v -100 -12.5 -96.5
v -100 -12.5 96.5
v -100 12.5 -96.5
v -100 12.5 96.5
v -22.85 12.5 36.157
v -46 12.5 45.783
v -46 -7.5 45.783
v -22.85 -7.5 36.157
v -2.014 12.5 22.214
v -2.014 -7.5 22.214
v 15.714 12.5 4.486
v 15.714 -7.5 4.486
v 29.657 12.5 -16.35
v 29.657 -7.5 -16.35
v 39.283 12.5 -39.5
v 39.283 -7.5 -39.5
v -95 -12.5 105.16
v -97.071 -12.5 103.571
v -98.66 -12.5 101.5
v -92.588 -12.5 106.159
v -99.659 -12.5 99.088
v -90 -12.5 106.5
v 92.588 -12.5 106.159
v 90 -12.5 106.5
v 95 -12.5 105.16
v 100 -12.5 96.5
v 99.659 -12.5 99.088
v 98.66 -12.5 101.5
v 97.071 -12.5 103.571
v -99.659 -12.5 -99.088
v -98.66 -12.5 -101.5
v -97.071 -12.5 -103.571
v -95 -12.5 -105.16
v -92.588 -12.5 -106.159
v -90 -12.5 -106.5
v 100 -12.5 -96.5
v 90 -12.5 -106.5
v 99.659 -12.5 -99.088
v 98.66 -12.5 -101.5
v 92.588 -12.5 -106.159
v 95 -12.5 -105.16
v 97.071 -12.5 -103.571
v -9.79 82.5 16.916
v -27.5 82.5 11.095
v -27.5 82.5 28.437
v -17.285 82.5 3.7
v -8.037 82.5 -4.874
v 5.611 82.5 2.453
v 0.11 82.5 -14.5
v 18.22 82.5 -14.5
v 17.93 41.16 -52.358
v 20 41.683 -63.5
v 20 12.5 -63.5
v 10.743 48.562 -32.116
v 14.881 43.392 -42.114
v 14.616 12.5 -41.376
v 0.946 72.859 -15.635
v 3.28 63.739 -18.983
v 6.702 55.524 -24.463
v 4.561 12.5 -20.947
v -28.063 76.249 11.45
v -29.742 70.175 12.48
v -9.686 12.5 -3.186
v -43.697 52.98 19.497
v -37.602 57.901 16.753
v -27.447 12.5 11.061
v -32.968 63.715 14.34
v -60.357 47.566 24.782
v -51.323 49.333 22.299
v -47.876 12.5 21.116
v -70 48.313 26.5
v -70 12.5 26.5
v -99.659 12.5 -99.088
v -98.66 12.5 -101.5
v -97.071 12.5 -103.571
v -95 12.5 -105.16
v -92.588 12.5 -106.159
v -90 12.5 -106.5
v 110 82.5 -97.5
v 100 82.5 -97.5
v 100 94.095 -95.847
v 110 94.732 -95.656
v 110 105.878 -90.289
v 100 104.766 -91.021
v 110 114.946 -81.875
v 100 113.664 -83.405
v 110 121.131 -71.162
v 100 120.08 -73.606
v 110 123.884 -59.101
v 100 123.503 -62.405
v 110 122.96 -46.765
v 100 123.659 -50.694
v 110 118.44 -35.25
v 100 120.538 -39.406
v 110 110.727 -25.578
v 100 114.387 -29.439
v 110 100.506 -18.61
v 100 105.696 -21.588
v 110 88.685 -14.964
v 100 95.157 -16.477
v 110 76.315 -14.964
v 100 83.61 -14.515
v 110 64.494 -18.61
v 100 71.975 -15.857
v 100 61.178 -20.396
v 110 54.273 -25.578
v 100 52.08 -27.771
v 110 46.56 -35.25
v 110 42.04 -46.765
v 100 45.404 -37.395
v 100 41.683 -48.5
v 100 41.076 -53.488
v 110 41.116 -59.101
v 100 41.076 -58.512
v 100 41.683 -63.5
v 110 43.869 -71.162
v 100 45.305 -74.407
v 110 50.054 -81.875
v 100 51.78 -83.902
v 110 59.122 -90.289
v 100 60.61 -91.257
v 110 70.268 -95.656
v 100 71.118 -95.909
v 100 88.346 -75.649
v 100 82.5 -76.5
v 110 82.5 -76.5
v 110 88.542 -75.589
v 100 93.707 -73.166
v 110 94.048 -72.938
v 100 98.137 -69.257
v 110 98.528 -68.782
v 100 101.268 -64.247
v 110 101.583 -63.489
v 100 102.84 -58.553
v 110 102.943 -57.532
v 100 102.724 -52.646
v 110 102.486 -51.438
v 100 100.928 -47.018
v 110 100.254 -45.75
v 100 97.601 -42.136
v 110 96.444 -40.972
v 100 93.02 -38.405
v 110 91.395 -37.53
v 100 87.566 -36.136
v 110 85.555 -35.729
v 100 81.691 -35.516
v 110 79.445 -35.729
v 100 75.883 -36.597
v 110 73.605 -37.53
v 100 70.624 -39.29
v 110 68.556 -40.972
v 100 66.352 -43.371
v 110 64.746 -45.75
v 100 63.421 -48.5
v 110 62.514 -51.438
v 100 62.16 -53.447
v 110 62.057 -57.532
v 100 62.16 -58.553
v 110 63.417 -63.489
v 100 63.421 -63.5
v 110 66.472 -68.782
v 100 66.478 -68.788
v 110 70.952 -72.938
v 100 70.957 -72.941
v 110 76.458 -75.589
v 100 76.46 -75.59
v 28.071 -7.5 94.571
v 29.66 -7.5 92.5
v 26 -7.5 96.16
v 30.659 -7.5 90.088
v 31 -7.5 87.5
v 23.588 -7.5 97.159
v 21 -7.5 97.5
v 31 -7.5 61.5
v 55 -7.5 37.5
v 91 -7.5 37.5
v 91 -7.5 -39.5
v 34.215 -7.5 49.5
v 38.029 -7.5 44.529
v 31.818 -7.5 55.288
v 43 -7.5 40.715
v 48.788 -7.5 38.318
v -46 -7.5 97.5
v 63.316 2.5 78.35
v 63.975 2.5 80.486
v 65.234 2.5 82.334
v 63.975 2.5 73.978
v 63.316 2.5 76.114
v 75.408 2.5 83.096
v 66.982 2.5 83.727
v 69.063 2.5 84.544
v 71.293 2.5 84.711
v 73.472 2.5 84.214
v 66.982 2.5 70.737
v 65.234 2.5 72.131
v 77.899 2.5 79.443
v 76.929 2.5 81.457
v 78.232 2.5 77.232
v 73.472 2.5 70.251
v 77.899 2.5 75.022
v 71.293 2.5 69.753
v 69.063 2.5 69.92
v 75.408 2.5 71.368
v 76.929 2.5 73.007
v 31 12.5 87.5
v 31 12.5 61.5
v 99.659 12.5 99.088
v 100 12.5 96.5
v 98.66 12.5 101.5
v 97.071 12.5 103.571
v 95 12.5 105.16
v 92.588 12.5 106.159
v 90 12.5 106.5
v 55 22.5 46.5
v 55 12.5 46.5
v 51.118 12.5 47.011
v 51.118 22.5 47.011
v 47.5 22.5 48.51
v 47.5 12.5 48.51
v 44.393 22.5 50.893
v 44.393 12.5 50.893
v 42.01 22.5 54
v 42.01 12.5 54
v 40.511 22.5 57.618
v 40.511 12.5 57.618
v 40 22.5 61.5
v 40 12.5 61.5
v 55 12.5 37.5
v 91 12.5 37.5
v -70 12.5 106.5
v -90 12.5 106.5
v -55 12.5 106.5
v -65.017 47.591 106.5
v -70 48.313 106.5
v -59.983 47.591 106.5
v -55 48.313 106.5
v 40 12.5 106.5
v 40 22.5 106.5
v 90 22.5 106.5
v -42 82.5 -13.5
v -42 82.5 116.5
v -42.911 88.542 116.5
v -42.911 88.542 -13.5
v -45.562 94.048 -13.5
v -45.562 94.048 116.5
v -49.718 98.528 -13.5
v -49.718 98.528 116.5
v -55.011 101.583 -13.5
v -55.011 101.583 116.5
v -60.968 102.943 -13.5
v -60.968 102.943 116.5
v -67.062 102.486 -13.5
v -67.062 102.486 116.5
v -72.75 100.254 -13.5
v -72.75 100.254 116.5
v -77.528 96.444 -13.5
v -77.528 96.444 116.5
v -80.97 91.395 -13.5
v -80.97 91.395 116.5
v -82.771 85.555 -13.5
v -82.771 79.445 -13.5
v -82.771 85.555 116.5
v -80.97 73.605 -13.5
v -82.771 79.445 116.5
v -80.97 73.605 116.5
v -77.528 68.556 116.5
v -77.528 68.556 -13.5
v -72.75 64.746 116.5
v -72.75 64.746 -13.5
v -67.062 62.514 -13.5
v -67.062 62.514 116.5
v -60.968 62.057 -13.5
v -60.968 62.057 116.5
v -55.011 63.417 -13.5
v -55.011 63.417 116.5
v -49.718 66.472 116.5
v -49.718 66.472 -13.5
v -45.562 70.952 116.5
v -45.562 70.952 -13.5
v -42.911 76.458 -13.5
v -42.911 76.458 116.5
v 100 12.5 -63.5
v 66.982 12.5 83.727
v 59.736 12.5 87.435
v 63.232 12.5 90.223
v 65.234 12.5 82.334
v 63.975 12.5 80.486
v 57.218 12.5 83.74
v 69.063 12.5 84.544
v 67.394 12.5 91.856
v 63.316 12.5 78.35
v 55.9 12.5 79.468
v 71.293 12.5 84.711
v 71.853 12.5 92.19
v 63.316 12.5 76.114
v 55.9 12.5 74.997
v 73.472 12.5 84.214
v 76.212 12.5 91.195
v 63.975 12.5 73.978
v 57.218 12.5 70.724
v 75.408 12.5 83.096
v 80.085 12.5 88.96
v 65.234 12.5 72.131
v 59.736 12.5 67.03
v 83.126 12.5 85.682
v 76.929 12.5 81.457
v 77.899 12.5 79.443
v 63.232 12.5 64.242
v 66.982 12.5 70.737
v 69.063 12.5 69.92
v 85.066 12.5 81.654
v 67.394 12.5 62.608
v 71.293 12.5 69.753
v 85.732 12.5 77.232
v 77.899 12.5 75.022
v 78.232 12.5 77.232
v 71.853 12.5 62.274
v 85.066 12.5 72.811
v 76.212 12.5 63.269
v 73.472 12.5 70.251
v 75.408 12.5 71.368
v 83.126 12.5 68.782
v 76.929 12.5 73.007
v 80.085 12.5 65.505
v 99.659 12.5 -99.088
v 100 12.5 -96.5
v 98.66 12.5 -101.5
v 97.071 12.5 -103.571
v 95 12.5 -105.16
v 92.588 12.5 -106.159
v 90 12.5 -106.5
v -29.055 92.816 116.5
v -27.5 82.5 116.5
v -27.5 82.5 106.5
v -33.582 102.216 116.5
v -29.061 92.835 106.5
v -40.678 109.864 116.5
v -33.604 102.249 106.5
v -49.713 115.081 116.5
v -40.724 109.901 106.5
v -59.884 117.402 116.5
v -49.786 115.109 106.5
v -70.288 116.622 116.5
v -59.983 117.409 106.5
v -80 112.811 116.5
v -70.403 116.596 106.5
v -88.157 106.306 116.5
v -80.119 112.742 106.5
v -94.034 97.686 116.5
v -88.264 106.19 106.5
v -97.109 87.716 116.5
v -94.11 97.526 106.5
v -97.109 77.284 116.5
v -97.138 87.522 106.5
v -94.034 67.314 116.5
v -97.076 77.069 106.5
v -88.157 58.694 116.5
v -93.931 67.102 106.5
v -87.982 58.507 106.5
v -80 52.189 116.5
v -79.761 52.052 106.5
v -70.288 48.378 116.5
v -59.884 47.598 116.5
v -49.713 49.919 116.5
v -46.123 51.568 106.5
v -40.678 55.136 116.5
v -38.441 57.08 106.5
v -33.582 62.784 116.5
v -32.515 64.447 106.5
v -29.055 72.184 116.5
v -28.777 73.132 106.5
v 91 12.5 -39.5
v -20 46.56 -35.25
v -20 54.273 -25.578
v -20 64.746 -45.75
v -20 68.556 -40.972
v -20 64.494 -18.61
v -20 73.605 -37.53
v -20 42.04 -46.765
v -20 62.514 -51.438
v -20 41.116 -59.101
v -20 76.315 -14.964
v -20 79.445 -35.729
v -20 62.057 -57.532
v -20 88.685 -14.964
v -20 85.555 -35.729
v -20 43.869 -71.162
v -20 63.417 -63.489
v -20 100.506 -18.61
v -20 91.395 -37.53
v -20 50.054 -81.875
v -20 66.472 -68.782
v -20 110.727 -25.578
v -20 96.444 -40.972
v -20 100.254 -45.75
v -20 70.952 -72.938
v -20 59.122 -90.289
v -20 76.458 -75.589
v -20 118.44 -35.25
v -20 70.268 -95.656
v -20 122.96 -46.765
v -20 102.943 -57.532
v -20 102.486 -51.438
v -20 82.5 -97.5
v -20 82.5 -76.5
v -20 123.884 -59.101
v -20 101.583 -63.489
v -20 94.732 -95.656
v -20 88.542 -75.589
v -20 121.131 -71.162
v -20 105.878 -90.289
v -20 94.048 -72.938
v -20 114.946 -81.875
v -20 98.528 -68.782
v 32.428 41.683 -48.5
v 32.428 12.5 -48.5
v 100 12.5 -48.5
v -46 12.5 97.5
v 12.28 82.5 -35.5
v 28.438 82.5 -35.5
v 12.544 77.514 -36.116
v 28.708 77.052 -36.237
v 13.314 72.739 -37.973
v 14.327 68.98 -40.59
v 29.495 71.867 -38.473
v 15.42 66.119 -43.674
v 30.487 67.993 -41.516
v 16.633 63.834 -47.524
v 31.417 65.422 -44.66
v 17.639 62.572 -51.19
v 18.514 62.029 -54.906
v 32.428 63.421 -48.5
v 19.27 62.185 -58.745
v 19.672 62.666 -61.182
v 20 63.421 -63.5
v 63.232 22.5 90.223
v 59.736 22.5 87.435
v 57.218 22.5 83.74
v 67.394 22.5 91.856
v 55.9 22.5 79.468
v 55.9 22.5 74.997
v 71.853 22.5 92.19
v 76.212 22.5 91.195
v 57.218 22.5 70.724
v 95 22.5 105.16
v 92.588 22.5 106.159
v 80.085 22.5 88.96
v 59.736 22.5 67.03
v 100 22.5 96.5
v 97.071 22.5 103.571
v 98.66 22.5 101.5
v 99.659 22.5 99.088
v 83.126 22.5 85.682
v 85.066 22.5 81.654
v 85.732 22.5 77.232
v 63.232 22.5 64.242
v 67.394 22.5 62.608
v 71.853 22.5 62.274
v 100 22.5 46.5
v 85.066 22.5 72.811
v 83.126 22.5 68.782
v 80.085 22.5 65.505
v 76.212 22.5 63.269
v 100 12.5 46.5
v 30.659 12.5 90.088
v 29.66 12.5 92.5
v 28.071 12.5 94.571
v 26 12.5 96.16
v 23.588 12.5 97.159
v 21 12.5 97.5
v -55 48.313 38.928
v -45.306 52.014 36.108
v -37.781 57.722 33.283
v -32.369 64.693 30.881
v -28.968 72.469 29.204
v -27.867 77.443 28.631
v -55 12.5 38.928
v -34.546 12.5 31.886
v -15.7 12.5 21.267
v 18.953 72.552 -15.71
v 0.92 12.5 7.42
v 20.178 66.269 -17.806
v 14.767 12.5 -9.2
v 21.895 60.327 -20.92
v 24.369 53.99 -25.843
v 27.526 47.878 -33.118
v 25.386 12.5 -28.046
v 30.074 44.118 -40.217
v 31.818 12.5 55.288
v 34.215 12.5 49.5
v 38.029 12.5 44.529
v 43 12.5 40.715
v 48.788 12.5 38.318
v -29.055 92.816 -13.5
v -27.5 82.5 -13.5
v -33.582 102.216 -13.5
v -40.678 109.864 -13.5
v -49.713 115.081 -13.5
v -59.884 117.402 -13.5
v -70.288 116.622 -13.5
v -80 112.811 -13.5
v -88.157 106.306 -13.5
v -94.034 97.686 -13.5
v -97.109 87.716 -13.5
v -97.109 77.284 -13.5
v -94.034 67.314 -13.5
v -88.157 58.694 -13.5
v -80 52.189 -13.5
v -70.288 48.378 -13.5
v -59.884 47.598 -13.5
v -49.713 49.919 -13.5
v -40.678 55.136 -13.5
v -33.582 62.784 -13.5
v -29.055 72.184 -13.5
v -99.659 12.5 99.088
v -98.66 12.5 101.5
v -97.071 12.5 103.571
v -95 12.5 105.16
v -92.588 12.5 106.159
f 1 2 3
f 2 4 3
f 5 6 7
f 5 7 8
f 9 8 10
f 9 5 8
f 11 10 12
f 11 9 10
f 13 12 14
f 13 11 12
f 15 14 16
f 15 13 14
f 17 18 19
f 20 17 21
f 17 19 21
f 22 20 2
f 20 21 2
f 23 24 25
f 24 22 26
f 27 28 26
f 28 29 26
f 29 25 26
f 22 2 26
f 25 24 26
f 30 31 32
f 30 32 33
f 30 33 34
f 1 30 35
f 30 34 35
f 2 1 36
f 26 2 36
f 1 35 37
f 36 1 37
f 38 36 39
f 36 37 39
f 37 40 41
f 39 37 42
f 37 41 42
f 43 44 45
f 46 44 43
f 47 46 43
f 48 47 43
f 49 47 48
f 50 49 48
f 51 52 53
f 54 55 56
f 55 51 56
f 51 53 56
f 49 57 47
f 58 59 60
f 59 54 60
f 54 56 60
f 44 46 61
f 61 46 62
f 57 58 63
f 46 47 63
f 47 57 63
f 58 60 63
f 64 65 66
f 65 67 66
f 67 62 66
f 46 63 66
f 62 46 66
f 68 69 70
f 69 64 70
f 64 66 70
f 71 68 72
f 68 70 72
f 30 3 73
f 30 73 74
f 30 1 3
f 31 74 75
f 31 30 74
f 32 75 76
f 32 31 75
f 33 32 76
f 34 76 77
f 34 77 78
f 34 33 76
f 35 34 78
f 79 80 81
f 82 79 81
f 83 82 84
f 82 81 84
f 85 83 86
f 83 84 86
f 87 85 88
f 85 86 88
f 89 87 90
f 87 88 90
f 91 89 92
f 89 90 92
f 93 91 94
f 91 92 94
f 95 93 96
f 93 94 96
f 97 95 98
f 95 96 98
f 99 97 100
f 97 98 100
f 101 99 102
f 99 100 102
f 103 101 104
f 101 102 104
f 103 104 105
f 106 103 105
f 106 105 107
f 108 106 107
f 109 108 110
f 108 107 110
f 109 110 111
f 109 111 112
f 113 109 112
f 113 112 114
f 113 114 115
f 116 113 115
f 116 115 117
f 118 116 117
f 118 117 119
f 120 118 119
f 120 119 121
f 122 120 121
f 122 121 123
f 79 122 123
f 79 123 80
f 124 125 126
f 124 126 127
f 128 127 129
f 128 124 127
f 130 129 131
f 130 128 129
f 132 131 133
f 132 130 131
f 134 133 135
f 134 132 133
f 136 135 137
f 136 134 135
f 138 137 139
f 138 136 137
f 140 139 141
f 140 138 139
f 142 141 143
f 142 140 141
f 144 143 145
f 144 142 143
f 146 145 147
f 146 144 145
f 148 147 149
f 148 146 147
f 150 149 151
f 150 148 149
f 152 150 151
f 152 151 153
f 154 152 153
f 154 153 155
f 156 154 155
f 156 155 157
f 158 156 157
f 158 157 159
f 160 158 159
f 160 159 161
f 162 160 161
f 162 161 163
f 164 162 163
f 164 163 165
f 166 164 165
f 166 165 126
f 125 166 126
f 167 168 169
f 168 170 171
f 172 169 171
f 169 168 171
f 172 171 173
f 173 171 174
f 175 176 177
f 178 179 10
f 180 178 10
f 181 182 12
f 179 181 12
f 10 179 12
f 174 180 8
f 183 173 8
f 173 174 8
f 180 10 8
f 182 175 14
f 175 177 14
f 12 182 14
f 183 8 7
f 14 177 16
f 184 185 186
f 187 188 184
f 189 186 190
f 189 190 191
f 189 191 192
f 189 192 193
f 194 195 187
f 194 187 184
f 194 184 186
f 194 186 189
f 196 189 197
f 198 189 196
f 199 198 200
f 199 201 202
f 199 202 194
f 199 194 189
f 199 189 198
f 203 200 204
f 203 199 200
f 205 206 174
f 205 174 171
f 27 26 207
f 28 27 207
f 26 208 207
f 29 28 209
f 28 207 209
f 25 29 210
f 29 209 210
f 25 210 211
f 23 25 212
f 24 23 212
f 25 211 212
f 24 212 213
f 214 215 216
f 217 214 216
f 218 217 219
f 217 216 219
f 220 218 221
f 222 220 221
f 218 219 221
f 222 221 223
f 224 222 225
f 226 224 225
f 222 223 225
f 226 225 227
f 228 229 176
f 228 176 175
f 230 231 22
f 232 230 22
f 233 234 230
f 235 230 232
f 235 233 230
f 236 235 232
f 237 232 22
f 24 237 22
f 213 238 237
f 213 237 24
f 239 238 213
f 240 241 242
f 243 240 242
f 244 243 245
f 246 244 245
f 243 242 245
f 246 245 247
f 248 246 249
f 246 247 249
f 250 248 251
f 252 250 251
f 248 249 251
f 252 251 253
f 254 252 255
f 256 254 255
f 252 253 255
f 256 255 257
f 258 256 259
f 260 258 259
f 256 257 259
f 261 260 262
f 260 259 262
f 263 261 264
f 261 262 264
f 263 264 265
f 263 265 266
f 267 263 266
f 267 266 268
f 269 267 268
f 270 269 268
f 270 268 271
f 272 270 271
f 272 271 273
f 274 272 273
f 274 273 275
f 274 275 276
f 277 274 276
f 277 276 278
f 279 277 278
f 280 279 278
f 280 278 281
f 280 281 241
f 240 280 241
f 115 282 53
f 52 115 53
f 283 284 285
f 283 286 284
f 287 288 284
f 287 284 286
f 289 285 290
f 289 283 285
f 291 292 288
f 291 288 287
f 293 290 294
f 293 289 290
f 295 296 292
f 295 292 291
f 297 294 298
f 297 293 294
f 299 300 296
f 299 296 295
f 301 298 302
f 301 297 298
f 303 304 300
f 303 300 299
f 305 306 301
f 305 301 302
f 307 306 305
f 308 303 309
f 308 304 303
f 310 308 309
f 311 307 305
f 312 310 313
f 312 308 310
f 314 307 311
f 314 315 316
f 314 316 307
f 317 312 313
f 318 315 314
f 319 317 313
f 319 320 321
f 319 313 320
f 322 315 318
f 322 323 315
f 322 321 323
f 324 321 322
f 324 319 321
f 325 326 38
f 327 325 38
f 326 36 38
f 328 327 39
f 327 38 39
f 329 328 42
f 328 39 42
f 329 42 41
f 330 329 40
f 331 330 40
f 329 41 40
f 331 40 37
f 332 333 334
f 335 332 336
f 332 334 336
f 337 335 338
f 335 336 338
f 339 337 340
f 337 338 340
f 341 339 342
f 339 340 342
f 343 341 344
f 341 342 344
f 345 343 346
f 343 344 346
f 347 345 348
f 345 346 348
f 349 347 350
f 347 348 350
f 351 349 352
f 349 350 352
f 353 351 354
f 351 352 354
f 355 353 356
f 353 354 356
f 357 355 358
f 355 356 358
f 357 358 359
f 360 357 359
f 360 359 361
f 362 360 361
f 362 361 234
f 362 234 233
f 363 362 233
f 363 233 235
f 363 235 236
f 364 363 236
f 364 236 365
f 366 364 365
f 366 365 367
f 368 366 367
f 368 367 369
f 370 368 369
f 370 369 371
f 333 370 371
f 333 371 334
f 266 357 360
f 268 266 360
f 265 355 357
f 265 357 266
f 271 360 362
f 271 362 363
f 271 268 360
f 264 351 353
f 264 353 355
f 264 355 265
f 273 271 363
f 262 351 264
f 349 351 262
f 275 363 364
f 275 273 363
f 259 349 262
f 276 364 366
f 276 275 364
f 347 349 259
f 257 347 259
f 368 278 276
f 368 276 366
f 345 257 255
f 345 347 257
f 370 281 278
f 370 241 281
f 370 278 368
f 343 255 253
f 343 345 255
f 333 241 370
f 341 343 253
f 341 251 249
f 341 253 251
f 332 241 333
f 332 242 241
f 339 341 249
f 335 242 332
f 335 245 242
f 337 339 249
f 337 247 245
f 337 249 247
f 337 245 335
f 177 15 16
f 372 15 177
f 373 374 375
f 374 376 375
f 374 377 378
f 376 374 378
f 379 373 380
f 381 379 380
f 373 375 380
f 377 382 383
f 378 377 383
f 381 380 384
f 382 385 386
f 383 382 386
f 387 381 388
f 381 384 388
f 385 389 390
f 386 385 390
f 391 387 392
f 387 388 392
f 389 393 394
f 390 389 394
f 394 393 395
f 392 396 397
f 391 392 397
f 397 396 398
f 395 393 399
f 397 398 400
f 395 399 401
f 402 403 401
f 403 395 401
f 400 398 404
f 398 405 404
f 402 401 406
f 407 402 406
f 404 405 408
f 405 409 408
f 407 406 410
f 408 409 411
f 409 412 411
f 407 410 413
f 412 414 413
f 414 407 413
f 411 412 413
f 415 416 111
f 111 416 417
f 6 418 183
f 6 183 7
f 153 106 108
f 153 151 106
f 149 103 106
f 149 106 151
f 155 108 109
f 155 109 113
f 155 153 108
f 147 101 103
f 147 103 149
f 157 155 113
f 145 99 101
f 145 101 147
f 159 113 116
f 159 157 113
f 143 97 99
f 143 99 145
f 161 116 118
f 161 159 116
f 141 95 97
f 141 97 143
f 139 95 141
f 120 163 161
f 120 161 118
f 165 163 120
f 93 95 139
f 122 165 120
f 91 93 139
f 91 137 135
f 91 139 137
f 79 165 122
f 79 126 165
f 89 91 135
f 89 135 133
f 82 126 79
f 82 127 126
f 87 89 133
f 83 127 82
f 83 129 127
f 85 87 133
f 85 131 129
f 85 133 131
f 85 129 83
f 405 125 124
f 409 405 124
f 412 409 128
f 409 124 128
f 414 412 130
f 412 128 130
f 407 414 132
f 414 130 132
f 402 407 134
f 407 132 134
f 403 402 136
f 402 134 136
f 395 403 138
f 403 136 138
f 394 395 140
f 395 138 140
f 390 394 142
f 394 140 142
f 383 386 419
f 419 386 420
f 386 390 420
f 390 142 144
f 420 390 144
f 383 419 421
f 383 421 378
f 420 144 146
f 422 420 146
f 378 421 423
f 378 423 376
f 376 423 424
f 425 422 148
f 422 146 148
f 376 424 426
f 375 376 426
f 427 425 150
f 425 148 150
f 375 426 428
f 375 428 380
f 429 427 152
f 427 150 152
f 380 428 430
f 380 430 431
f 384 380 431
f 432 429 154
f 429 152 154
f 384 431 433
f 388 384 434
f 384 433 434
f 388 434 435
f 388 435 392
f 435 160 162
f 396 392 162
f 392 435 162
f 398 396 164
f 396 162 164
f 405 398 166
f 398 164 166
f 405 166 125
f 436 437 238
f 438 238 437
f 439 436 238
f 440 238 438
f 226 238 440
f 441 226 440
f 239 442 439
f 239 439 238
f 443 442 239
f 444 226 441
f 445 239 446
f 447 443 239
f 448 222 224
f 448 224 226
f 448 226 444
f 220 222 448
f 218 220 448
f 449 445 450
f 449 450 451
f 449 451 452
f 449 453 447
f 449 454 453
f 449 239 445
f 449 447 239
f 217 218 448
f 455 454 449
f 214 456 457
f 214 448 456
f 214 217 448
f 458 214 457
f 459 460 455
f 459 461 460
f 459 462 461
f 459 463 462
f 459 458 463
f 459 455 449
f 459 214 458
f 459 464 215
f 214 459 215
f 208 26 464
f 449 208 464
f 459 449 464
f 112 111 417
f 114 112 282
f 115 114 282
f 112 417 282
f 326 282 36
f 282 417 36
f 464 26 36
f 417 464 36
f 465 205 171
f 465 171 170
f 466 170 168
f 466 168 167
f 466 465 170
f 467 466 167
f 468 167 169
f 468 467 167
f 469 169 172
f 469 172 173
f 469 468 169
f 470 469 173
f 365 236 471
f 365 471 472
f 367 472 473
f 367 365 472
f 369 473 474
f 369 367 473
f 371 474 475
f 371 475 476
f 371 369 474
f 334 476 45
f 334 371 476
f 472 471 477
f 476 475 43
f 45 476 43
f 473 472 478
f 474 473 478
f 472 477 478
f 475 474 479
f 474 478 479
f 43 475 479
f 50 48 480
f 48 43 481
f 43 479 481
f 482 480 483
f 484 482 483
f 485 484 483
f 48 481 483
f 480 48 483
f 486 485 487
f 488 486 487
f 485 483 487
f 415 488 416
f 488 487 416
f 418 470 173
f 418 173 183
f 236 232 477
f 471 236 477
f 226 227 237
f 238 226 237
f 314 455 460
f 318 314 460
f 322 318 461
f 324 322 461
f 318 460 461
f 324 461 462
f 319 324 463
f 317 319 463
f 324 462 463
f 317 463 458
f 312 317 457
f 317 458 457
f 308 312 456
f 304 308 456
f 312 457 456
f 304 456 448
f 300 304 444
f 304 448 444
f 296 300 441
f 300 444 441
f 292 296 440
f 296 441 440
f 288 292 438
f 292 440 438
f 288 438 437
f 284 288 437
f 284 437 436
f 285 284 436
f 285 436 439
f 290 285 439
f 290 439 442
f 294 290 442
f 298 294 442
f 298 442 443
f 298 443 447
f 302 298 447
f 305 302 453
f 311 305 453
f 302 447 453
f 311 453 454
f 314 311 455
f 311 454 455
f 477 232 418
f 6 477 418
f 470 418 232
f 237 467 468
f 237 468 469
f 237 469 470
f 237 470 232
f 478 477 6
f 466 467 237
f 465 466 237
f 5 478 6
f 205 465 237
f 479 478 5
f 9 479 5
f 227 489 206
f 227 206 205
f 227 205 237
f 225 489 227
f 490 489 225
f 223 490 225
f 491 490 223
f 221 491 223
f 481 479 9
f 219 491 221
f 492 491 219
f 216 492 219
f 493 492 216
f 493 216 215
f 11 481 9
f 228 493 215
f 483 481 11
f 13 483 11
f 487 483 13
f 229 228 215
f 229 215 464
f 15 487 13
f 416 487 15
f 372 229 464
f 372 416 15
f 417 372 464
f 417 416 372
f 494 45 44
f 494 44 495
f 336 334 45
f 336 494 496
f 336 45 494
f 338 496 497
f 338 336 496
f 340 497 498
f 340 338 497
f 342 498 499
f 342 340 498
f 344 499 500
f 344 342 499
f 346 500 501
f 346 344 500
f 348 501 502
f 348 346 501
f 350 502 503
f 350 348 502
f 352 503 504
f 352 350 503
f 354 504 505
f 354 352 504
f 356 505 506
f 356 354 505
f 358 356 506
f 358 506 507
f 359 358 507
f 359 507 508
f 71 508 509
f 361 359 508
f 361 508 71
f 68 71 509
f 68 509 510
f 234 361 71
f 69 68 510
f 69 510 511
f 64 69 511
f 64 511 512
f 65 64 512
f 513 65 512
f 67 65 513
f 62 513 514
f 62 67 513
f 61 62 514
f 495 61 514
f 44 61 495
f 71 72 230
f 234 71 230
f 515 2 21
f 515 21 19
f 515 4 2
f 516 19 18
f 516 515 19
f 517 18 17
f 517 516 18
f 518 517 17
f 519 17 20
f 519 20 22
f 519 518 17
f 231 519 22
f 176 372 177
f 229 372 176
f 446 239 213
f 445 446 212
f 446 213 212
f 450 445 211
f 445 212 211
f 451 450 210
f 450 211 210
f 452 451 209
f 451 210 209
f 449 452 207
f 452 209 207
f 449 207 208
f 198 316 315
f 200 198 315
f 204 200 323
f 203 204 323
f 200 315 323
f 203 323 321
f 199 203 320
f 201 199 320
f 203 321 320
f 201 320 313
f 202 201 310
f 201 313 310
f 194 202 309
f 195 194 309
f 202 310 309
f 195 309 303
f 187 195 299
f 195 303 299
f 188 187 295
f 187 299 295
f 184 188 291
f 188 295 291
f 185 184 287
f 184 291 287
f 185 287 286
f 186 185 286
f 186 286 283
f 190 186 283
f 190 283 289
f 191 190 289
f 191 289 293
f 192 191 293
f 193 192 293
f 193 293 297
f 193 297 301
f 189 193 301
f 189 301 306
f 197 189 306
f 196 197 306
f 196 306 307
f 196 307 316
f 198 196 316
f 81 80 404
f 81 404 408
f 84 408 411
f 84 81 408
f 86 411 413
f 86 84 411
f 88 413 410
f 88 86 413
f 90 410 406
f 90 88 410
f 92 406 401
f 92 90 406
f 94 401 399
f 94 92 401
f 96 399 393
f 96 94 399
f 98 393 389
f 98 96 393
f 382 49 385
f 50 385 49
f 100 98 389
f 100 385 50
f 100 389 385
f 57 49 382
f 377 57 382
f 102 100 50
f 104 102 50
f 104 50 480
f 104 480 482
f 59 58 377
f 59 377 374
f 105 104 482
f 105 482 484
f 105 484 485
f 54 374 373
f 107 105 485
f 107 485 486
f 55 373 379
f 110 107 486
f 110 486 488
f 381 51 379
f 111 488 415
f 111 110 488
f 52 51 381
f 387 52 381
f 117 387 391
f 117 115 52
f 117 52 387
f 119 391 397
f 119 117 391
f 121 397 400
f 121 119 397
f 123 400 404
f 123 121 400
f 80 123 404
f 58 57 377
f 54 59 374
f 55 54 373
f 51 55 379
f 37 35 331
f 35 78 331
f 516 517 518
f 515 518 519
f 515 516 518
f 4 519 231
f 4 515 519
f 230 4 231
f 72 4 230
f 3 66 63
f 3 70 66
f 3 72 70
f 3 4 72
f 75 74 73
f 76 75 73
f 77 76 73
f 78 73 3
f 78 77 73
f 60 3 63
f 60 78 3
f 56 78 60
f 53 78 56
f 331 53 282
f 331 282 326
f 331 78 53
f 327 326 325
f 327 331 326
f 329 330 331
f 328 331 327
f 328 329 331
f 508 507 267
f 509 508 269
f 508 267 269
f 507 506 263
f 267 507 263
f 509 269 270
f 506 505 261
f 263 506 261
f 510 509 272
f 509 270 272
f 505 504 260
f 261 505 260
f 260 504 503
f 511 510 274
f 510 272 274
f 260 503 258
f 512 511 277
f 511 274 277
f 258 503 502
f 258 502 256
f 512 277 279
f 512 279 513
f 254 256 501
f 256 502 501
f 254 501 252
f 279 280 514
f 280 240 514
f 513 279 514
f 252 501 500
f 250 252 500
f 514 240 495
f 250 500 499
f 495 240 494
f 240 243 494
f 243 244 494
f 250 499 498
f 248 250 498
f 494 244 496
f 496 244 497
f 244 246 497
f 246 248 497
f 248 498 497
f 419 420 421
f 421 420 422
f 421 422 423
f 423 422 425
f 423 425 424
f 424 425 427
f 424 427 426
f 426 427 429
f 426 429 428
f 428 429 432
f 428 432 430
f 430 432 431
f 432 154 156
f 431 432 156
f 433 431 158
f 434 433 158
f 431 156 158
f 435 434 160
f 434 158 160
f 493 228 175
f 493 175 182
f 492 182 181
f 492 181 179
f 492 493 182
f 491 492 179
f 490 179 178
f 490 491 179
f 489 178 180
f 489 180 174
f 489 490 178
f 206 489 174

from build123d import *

# Parameters (mm, degrees)
SKETCH1_W                = 200
SKETCH1_H                = 213
BOSS_EXTRUDE1_DEPTH      = 12.5
FILLET1_R                = 10
BOSS_EXTRUDE2_DEPTH      = 70
BOSS_EXTRUDE3_DEPTH      = 10
CUT_EXTRUDE1_DEPTH       = 20
SKETCH5_R                = 7.5
CUT_EXTRUDE2_DEPTH       = 20
SKETCH6_R                = 15
CUT_EXTRUDE3_DEPTH       = 10
SKETCH8_R                = 35
BOSS_EXTRUDE4_DEPTH      = 10
BOSS_EXTRUDE4_DEPTH_BACK = 120
SKETCH9_R                = 20.5
CUT_EXTRUDE4_DEPTH       = 224
SKETCH10_R               = 41.5
SKETCH10_R_2             = 20.5
BOSS_EXTRUDE5_DEPTH      = 10
BOSS_EXTRUDE5_DEPTH_BACK = 120
SKETCH11_R               = 20.5
CUT_EXTRUDE5_DEPTH       = 201


with BuildPart() as part:
    # Sketch1 → Boss-Extrude1 (new body, symmetric)
    with BuildSketch(Plane(origin=(0, 0, 0), x_dir=(1, 0, 0), z_dir=(0, 1, 0))):
        Rectangle(SKETCH1_W, SKETCH1_H)
    extrude(amount=BOSS_EXTRUDE1_DEPTH, both=True)

    # Fillet1
    fillet1_edges = [part.edges().sort_by_distance(p)[0] for p in [
        (100, 0, 106.5),
        (-100, 0, 106.5),
        (-100, 0, -106.5),
        (100, 0, -106.5),
    ]]
    fillet(fillet1_edges, radius=FILLET1_R)

    # Sketch2 → Boss-Extrude2 (add)
    with BuildSketch(Plane(origin=(0, 12.5, 0), x_dir=(1, 0, 0), z_dir=(0, 1, 0))):
        with BuildLine():
            Line((-70, -106.5), (-55, -106.5))
            Line((-55, -106.5), (-55, -38.928392203))
            ThreePointArc((-55, -38.928392203), (0.920301962, -7.420301962), (32.428392203, 48.5))
            Line((32.428392203, 48.5), (100, 48.5))
            Line((100, 48.5), (100, 63.5))
            Line((100, 63.5), (20, 63.5))
            ThreePointArc((20, 63.5), (-9.686299755, 3.186299755), (-70, -26.5))
            Line((-70, -26.5), (-70, -106.5))
        make_face()
    extrude(amount=BOSS_EXTRUDE2_DEPTH)

    # Sketch3 → Boss-Extrude3 (add)
    with BuildSketch(Plane(origin=(0, 12.5, 0), x_dir=(1, 0, 0), z_dir=(0, 1, 0))):
        with BuildLine():
            Line((100, -46.5), (55, -46.5))
            ThreePointArc((55, -46.5), (44.393398282, -50.893398282), (40, -61.5))
            Line((40, -61.5), (40, -106.5))
            Line((40, -106.5), (90, -106.5))
            ThreePointArc((90, -106.5), (97.071067812, -103.571067812), (100, -96.5))
            Line((100, -96.5), (100, -46.5))
        make_face()
    extrude(amount=BOSS_EXTRUDE3_DEPTH)

    # Sketch4 → Cut-Extrude1 (cut)
    with BuildSketch(Plane(origin=(0, 12.5, 0), x_dir=(1, 0, 0), z_dir=(0, 1, 0))):
        with BuildLine():
            Line((-46, -97.5), (-46, -45.782855831))
            ThreePointArc((-46, -45.782855831), (7.284262993, -13.784262993), (39.282855831, 39.5))
            Line((39.282855831, 39.5), (91, 39.5))
            Line((91, 39.5), (91, -37.5))
            Line((91, -37.5), (55, -37.5))
            ThreePointArc((55, -37.5), (38.029437252, -44.529437252), (31, -61.5))
            Line((31, -61.5), (31, -87.5))
            ThreePointArc((31, -87.5), (28.071067812, -94.571067812), (21, -97.5))
            Line((21, -97.5), (-46, -97.5))
        make_face()
    extrude(amount=-CUT_EXTRUDE1_DEPTH, mode=Mode.SUBTRACT)

    # Sketch5 → Cut-Extrude2 (cut)
    with BuildSketch(Plane(origin=(0, 22.5, 0), x_dir=(1, 0, 0), z_dir=(0, 1, 0))):
        with Locations((70.732233047, -77.232233047)):
            Circle(SKETCH5_R)
    extrude(amount=-CUT_EXTRUDE2_DEPTH, mode=Mode.SUBTRACT)

    # Sketch6 → Cut-Extrude3 (cut)
    with BuildSketch(Plane(origin=(0, 22.5, 0), x_dir=(1, 0, 0), z_dir=(0, 1, 0))):
        with Locations((70.732233047, -77.232233047)):
            Circle(SKETCH6_R)
    extrude(amount=-CUT_EXTRUDE3_DEPTH, mode=Mode.SUBTRACT)

    # Sketch8 → Boss-Extrude4 (add, two sides)
    with BuildSketch(Plane.XY.offset(106.5)) as boss_extrude4_sk:
        with Locations((-62.5, 82.5)):
            Circle(SKETCH8_R)
    extrude(amount=BOSS_EXTRUDE4_DEPTH)
    extrude(boss_extrude4_sk.sketch, amount=-BOSS_EXTRUDE4_DEPTH_BACK)

    # Sketch9 → Cut-Extrude4 (cut, through all)
    with BuildSketch(Plane.XY.offset(116.5)):
        with Locations((-62.5, 82.5)):
            Circle(SKETCH9_R)
    extrude(amount=-CUT_EXTRUDE4_DEPTH, mode=Mode.SUBTRACT)

    # Sketch10 → Boss-Extrude5 (add, two sides)
    with BuildSketch(Plane(origin=(100, 0, 0), x_dir=(0, 0, -1), z_dir=(1, 0, 0))) as boss_extrude5_sk:
        with Locations((56, 82.5)):
            Circle(SKETCH10_R)
        with Locations((56, 82.5)):
            Circle(SKETCH10_R_2, mode=Mode.SUBTRACT)
    extrude(amount=BOSS_EXTRUDE5_DEPTH)
    extrude(boss_extrude5_sk.sketch, amount=-BOSS_EXTRUDE5_DEPTH_BACK)

    # Sketch11 → Cut-Extrude5 (cut, through all)
    with BuildSketch(Plane(origin=(100, 0, 0), x_dir=(0, 0, -1), z_dir=(1, 0, 0))):
        with Locations((56, 82.5)):
            Circle(SKETCH11_R)
    extrude(amount=-CUT_EXTRUDE5_DEPTH, mode=Mode.SUBTRACT)


solid = part.part
